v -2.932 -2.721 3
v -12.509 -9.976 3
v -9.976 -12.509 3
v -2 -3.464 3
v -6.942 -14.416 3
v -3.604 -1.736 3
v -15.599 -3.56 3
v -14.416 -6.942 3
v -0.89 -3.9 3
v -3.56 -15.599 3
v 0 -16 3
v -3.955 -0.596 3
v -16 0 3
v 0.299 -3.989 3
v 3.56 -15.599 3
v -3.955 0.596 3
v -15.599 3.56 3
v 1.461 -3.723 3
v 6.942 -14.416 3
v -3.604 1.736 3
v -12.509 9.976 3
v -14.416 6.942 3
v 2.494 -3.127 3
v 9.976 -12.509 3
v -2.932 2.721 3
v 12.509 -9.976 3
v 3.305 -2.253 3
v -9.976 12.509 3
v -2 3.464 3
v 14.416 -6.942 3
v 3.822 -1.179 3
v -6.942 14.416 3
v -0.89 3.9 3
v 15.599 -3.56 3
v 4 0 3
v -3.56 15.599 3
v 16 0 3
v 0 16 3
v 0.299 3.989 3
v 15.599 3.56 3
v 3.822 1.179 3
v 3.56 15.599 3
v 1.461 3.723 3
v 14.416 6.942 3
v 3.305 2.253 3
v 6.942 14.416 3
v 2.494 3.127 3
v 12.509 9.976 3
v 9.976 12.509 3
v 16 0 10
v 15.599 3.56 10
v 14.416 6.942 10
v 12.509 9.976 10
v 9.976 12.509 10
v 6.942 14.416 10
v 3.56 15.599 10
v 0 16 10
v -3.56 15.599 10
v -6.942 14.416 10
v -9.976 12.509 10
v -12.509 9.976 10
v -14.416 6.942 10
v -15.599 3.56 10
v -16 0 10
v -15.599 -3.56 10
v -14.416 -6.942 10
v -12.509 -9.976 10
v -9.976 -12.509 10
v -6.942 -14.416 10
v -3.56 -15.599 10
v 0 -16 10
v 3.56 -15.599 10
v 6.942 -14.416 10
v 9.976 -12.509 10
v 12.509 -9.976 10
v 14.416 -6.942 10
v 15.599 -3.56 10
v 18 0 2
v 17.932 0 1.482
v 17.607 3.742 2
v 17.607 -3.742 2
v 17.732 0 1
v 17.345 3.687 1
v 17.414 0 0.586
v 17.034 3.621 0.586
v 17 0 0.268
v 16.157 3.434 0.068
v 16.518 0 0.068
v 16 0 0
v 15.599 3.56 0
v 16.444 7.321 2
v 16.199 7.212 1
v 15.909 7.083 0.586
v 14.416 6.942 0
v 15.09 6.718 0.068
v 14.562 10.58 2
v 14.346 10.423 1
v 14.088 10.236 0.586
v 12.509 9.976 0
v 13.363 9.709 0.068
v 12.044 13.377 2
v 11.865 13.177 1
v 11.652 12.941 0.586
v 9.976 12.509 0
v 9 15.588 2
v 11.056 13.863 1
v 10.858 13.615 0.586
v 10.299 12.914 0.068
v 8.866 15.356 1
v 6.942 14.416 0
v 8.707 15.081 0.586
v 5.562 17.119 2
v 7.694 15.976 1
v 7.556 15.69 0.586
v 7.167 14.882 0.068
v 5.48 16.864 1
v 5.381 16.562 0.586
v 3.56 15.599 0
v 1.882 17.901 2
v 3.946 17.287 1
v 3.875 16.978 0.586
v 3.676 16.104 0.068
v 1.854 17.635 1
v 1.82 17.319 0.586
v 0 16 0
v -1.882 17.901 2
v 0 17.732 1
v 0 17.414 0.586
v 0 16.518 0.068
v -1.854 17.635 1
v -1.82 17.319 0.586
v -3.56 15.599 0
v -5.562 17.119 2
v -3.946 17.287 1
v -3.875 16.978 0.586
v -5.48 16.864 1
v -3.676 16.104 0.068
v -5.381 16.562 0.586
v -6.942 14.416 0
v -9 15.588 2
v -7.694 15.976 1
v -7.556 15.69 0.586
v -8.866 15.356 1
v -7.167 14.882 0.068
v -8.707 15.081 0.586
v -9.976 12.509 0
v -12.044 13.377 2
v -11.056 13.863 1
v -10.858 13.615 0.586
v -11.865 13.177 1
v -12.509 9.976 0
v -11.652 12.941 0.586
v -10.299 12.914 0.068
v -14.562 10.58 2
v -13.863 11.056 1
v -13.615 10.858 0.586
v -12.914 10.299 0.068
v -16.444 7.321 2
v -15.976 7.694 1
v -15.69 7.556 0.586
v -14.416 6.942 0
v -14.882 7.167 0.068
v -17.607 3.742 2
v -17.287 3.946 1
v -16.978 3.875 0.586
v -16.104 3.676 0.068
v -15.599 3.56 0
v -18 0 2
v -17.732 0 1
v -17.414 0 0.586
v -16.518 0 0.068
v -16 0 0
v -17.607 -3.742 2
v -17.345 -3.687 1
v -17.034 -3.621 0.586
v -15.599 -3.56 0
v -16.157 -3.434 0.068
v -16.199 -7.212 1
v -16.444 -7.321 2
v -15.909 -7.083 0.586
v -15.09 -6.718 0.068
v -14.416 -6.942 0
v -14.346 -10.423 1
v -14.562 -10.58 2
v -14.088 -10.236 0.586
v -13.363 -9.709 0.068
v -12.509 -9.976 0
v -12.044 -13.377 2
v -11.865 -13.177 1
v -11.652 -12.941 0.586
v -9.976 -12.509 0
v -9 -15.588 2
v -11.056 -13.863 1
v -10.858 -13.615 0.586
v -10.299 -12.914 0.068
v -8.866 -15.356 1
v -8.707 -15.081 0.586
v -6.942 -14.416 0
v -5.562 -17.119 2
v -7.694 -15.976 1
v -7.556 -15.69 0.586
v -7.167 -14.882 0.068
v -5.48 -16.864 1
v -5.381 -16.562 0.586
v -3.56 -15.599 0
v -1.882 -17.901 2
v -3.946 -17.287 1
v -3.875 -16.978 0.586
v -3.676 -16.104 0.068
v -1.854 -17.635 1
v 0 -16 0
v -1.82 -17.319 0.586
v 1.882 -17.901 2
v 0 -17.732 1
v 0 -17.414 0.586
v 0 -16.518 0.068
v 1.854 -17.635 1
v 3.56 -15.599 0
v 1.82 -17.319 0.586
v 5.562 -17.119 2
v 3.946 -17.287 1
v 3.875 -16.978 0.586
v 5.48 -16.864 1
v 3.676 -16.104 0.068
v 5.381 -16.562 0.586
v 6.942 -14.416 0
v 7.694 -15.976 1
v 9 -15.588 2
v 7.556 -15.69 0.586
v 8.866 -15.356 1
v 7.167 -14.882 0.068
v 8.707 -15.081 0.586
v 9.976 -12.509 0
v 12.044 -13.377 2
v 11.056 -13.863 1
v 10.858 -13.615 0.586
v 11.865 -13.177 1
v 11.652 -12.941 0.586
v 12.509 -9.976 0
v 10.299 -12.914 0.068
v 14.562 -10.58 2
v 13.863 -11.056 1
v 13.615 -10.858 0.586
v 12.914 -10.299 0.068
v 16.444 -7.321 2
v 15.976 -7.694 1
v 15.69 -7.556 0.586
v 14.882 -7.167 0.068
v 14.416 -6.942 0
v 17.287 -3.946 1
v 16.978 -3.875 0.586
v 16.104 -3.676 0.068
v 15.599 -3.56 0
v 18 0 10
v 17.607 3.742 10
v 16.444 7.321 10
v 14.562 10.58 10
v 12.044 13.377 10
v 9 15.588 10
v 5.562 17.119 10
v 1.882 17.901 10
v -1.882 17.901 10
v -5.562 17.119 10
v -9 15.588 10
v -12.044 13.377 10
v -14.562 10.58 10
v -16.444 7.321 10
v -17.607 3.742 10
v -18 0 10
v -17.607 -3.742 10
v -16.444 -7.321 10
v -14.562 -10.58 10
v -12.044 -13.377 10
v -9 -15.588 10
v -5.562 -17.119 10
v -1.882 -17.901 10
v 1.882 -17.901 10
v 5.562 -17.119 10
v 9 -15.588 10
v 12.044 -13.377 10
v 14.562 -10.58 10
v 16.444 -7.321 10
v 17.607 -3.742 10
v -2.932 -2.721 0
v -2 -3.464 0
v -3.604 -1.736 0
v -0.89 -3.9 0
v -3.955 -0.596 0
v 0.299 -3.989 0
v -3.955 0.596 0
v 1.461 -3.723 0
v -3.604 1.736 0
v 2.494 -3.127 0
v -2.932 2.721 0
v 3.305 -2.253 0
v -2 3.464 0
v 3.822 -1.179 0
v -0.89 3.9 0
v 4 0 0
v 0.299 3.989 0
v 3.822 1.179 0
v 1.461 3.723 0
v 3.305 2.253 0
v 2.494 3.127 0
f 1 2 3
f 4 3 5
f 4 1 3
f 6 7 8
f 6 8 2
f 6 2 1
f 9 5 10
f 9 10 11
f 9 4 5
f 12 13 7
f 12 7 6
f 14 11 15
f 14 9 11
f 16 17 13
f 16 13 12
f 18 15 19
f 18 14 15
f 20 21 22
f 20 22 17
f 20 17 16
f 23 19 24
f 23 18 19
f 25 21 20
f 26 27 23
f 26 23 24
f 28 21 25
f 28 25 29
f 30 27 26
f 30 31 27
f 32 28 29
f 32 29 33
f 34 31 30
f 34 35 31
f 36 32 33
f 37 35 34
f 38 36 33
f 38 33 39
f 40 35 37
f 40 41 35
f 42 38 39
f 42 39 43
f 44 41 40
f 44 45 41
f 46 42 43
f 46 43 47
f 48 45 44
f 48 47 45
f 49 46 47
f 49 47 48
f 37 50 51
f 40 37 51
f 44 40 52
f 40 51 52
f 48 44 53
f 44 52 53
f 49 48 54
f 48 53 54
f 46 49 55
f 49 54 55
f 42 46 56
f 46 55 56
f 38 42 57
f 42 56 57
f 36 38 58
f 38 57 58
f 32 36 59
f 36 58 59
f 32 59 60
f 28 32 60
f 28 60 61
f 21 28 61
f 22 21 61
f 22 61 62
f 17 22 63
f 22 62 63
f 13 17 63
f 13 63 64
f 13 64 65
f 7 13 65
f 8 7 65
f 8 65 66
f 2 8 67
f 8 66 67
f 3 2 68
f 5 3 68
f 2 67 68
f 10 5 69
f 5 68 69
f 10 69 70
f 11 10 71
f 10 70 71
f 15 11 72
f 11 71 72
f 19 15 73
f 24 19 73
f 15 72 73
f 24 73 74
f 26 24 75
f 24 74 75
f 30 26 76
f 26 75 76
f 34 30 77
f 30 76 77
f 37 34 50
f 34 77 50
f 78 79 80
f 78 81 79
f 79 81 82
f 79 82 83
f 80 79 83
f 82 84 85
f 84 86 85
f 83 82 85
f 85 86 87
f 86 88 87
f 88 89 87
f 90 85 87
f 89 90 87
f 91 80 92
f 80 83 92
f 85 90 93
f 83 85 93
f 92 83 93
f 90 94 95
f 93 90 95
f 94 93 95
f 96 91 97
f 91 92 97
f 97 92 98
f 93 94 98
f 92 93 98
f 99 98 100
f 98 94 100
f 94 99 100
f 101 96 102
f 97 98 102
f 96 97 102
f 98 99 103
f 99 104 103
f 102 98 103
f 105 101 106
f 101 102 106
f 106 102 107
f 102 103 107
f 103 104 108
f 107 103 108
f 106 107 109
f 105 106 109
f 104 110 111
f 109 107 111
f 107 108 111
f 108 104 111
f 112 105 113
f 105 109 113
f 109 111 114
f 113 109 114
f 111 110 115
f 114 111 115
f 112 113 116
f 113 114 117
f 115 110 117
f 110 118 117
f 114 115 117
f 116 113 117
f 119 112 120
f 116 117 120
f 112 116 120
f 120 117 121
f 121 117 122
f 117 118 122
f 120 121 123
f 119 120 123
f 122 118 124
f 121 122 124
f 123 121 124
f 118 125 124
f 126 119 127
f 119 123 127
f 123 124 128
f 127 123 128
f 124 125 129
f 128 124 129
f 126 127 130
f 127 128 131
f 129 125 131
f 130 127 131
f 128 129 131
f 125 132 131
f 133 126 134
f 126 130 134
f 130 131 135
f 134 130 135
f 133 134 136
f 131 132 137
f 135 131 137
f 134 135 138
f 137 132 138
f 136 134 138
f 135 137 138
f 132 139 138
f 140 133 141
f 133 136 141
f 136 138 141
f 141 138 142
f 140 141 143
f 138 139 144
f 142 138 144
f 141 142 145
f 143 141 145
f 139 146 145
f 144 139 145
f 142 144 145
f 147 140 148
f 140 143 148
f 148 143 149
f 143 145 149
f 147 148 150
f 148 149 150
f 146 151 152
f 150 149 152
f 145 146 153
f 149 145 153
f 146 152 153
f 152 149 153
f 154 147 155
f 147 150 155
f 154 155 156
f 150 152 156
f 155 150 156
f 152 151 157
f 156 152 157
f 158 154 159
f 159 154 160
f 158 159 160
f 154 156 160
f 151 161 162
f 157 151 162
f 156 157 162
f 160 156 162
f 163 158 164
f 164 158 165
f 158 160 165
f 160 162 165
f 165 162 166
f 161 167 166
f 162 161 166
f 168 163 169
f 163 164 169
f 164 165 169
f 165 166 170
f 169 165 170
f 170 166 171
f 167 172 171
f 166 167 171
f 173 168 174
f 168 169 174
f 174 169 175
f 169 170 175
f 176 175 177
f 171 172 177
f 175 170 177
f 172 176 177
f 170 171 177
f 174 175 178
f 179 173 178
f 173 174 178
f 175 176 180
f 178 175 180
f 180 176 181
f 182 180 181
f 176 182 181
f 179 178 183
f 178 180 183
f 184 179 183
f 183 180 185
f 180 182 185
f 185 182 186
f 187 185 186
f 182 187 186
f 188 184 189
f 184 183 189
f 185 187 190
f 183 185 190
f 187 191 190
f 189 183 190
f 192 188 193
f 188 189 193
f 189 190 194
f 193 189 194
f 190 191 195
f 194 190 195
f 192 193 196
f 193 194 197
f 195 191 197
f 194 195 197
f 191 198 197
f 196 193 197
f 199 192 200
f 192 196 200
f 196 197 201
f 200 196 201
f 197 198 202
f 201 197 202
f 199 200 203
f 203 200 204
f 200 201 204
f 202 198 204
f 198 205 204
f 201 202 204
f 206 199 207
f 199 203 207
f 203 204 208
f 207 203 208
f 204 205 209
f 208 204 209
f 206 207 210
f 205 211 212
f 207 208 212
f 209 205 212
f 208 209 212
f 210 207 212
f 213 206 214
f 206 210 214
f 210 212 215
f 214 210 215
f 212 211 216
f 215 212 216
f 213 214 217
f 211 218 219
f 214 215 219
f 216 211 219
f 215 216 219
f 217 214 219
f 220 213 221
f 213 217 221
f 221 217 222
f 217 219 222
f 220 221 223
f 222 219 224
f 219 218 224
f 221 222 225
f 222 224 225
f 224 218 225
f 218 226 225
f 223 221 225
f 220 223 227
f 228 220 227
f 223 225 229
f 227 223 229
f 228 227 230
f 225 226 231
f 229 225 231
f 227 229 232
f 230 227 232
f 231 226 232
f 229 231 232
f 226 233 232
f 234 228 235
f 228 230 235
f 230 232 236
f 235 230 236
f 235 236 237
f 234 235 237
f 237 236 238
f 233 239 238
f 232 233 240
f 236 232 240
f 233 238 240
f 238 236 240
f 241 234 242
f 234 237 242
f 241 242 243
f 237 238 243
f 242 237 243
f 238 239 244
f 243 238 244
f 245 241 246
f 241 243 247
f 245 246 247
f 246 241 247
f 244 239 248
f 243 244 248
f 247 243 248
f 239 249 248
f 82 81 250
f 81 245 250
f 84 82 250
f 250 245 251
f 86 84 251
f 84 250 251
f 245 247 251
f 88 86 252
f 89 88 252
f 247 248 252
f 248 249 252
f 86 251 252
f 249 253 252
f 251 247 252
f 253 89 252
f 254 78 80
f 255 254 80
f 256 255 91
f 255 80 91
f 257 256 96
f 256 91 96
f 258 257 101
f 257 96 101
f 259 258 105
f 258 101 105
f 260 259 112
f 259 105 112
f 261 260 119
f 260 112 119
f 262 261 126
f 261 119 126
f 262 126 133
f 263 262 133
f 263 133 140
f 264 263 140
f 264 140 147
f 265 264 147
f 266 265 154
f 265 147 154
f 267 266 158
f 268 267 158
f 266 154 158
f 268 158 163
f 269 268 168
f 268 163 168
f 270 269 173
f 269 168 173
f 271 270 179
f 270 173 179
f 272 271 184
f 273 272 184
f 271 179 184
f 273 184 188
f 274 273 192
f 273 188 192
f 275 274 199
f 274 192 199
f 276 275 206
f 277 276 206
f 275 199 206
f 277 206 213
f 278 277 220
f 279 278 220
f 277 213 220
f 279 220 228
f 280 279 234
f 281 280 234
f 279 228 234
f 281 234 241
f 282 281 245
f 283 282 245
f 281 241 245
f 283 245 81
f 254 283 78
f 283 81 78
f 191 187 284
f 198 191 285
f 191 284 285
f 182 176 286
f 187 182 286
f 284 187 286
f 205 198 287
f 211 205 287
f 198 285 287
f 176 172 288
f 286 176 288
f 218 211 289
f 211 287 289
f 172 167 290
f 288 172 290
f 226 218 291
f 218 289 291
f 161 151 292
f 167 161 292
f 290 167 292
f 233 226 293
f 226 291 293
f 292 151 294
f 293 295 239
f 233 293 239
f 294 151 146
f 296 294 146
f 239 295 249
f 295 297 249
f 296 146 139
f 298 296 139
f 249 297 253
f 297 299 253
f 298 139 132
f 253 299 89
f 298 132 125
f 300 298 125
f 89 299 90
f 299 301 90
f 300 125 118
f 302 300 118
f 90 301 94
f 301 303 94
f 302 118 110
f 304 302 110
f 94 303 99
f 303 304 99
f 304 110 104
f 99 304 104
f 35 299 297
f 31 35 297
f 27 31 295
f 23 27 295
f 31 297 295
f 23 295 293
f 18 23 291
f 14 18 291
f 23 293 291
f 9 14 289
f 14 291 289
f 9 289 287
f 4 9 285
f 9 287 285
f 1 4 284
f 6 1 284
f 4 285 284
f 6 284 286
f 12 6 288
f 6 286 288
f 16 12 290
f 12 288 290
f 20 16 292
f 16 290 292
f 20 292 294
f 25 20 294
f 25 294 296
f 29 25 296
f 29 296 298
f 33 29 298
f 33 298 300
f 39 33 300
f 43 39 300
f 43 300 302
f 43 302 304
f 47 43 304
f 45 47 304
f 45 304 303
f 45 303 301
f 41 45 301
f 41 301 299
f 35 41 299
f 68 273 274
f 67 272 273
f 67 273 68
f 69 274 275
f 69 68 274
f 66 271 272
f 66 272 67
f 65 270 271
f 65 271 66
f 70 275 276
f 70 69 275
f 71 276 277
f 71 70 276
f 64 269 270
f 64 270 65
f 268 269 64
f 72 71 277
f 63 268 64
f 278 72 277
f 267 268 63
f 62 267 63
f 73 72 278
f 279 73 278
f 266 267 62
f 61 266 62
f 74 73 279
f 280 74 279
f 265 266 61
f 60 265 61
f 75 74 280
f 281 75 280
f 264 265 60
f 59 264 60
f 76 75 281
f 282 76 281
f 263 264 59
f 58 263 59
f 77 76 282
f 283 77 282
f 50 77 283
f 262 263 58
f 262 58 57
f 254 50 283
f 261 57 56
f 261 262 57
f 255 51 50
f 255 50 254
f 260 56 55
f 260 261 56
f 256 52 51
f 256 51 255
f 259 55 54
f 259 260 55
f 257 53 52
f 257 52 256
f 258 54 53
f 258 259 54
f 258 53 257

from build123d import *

# Parameters (mm, degrees)
F0_R     = 18
F1_DEPTH = 10
F2_R     = 16
F3_DEPTH = 7
F4_R     = 4
F5_DEPTH = 25
F6_R     = 2


with BuildPart() as f1:
    # F0 (on Top) → F1 (new body)
    with BuildSketch(Plane.XY):
        Circle(F0_R)
    extrude(amount=F1_DEPTH)

    # F2 (on face) → F3 (cut)
    with BuildSketch(Plane.XY.offset(10)):
        Circle(F2_R)
    extrude(amount=-F3_DEPTH, mode=Mode.SUBTRACT)

    # F4 (on face) → F5 (cut)
    with BuildSketch(Plane(origin=(0, 0, 0), x_dir=(1, 0, 0), z_dir=(0, 0, -1))):
        Circle(F4_R)
    extrude(amount=-F5_DEPTH, mode=Mode.SUBTRACT)

    # F6
    f6_edges = [f1.edges().sort_by_distance(p)[0] for p in [
        (-18, 0, 0),
    ]]
    fillet(f6_edges, radius=F6_R)


solid = f1.part
